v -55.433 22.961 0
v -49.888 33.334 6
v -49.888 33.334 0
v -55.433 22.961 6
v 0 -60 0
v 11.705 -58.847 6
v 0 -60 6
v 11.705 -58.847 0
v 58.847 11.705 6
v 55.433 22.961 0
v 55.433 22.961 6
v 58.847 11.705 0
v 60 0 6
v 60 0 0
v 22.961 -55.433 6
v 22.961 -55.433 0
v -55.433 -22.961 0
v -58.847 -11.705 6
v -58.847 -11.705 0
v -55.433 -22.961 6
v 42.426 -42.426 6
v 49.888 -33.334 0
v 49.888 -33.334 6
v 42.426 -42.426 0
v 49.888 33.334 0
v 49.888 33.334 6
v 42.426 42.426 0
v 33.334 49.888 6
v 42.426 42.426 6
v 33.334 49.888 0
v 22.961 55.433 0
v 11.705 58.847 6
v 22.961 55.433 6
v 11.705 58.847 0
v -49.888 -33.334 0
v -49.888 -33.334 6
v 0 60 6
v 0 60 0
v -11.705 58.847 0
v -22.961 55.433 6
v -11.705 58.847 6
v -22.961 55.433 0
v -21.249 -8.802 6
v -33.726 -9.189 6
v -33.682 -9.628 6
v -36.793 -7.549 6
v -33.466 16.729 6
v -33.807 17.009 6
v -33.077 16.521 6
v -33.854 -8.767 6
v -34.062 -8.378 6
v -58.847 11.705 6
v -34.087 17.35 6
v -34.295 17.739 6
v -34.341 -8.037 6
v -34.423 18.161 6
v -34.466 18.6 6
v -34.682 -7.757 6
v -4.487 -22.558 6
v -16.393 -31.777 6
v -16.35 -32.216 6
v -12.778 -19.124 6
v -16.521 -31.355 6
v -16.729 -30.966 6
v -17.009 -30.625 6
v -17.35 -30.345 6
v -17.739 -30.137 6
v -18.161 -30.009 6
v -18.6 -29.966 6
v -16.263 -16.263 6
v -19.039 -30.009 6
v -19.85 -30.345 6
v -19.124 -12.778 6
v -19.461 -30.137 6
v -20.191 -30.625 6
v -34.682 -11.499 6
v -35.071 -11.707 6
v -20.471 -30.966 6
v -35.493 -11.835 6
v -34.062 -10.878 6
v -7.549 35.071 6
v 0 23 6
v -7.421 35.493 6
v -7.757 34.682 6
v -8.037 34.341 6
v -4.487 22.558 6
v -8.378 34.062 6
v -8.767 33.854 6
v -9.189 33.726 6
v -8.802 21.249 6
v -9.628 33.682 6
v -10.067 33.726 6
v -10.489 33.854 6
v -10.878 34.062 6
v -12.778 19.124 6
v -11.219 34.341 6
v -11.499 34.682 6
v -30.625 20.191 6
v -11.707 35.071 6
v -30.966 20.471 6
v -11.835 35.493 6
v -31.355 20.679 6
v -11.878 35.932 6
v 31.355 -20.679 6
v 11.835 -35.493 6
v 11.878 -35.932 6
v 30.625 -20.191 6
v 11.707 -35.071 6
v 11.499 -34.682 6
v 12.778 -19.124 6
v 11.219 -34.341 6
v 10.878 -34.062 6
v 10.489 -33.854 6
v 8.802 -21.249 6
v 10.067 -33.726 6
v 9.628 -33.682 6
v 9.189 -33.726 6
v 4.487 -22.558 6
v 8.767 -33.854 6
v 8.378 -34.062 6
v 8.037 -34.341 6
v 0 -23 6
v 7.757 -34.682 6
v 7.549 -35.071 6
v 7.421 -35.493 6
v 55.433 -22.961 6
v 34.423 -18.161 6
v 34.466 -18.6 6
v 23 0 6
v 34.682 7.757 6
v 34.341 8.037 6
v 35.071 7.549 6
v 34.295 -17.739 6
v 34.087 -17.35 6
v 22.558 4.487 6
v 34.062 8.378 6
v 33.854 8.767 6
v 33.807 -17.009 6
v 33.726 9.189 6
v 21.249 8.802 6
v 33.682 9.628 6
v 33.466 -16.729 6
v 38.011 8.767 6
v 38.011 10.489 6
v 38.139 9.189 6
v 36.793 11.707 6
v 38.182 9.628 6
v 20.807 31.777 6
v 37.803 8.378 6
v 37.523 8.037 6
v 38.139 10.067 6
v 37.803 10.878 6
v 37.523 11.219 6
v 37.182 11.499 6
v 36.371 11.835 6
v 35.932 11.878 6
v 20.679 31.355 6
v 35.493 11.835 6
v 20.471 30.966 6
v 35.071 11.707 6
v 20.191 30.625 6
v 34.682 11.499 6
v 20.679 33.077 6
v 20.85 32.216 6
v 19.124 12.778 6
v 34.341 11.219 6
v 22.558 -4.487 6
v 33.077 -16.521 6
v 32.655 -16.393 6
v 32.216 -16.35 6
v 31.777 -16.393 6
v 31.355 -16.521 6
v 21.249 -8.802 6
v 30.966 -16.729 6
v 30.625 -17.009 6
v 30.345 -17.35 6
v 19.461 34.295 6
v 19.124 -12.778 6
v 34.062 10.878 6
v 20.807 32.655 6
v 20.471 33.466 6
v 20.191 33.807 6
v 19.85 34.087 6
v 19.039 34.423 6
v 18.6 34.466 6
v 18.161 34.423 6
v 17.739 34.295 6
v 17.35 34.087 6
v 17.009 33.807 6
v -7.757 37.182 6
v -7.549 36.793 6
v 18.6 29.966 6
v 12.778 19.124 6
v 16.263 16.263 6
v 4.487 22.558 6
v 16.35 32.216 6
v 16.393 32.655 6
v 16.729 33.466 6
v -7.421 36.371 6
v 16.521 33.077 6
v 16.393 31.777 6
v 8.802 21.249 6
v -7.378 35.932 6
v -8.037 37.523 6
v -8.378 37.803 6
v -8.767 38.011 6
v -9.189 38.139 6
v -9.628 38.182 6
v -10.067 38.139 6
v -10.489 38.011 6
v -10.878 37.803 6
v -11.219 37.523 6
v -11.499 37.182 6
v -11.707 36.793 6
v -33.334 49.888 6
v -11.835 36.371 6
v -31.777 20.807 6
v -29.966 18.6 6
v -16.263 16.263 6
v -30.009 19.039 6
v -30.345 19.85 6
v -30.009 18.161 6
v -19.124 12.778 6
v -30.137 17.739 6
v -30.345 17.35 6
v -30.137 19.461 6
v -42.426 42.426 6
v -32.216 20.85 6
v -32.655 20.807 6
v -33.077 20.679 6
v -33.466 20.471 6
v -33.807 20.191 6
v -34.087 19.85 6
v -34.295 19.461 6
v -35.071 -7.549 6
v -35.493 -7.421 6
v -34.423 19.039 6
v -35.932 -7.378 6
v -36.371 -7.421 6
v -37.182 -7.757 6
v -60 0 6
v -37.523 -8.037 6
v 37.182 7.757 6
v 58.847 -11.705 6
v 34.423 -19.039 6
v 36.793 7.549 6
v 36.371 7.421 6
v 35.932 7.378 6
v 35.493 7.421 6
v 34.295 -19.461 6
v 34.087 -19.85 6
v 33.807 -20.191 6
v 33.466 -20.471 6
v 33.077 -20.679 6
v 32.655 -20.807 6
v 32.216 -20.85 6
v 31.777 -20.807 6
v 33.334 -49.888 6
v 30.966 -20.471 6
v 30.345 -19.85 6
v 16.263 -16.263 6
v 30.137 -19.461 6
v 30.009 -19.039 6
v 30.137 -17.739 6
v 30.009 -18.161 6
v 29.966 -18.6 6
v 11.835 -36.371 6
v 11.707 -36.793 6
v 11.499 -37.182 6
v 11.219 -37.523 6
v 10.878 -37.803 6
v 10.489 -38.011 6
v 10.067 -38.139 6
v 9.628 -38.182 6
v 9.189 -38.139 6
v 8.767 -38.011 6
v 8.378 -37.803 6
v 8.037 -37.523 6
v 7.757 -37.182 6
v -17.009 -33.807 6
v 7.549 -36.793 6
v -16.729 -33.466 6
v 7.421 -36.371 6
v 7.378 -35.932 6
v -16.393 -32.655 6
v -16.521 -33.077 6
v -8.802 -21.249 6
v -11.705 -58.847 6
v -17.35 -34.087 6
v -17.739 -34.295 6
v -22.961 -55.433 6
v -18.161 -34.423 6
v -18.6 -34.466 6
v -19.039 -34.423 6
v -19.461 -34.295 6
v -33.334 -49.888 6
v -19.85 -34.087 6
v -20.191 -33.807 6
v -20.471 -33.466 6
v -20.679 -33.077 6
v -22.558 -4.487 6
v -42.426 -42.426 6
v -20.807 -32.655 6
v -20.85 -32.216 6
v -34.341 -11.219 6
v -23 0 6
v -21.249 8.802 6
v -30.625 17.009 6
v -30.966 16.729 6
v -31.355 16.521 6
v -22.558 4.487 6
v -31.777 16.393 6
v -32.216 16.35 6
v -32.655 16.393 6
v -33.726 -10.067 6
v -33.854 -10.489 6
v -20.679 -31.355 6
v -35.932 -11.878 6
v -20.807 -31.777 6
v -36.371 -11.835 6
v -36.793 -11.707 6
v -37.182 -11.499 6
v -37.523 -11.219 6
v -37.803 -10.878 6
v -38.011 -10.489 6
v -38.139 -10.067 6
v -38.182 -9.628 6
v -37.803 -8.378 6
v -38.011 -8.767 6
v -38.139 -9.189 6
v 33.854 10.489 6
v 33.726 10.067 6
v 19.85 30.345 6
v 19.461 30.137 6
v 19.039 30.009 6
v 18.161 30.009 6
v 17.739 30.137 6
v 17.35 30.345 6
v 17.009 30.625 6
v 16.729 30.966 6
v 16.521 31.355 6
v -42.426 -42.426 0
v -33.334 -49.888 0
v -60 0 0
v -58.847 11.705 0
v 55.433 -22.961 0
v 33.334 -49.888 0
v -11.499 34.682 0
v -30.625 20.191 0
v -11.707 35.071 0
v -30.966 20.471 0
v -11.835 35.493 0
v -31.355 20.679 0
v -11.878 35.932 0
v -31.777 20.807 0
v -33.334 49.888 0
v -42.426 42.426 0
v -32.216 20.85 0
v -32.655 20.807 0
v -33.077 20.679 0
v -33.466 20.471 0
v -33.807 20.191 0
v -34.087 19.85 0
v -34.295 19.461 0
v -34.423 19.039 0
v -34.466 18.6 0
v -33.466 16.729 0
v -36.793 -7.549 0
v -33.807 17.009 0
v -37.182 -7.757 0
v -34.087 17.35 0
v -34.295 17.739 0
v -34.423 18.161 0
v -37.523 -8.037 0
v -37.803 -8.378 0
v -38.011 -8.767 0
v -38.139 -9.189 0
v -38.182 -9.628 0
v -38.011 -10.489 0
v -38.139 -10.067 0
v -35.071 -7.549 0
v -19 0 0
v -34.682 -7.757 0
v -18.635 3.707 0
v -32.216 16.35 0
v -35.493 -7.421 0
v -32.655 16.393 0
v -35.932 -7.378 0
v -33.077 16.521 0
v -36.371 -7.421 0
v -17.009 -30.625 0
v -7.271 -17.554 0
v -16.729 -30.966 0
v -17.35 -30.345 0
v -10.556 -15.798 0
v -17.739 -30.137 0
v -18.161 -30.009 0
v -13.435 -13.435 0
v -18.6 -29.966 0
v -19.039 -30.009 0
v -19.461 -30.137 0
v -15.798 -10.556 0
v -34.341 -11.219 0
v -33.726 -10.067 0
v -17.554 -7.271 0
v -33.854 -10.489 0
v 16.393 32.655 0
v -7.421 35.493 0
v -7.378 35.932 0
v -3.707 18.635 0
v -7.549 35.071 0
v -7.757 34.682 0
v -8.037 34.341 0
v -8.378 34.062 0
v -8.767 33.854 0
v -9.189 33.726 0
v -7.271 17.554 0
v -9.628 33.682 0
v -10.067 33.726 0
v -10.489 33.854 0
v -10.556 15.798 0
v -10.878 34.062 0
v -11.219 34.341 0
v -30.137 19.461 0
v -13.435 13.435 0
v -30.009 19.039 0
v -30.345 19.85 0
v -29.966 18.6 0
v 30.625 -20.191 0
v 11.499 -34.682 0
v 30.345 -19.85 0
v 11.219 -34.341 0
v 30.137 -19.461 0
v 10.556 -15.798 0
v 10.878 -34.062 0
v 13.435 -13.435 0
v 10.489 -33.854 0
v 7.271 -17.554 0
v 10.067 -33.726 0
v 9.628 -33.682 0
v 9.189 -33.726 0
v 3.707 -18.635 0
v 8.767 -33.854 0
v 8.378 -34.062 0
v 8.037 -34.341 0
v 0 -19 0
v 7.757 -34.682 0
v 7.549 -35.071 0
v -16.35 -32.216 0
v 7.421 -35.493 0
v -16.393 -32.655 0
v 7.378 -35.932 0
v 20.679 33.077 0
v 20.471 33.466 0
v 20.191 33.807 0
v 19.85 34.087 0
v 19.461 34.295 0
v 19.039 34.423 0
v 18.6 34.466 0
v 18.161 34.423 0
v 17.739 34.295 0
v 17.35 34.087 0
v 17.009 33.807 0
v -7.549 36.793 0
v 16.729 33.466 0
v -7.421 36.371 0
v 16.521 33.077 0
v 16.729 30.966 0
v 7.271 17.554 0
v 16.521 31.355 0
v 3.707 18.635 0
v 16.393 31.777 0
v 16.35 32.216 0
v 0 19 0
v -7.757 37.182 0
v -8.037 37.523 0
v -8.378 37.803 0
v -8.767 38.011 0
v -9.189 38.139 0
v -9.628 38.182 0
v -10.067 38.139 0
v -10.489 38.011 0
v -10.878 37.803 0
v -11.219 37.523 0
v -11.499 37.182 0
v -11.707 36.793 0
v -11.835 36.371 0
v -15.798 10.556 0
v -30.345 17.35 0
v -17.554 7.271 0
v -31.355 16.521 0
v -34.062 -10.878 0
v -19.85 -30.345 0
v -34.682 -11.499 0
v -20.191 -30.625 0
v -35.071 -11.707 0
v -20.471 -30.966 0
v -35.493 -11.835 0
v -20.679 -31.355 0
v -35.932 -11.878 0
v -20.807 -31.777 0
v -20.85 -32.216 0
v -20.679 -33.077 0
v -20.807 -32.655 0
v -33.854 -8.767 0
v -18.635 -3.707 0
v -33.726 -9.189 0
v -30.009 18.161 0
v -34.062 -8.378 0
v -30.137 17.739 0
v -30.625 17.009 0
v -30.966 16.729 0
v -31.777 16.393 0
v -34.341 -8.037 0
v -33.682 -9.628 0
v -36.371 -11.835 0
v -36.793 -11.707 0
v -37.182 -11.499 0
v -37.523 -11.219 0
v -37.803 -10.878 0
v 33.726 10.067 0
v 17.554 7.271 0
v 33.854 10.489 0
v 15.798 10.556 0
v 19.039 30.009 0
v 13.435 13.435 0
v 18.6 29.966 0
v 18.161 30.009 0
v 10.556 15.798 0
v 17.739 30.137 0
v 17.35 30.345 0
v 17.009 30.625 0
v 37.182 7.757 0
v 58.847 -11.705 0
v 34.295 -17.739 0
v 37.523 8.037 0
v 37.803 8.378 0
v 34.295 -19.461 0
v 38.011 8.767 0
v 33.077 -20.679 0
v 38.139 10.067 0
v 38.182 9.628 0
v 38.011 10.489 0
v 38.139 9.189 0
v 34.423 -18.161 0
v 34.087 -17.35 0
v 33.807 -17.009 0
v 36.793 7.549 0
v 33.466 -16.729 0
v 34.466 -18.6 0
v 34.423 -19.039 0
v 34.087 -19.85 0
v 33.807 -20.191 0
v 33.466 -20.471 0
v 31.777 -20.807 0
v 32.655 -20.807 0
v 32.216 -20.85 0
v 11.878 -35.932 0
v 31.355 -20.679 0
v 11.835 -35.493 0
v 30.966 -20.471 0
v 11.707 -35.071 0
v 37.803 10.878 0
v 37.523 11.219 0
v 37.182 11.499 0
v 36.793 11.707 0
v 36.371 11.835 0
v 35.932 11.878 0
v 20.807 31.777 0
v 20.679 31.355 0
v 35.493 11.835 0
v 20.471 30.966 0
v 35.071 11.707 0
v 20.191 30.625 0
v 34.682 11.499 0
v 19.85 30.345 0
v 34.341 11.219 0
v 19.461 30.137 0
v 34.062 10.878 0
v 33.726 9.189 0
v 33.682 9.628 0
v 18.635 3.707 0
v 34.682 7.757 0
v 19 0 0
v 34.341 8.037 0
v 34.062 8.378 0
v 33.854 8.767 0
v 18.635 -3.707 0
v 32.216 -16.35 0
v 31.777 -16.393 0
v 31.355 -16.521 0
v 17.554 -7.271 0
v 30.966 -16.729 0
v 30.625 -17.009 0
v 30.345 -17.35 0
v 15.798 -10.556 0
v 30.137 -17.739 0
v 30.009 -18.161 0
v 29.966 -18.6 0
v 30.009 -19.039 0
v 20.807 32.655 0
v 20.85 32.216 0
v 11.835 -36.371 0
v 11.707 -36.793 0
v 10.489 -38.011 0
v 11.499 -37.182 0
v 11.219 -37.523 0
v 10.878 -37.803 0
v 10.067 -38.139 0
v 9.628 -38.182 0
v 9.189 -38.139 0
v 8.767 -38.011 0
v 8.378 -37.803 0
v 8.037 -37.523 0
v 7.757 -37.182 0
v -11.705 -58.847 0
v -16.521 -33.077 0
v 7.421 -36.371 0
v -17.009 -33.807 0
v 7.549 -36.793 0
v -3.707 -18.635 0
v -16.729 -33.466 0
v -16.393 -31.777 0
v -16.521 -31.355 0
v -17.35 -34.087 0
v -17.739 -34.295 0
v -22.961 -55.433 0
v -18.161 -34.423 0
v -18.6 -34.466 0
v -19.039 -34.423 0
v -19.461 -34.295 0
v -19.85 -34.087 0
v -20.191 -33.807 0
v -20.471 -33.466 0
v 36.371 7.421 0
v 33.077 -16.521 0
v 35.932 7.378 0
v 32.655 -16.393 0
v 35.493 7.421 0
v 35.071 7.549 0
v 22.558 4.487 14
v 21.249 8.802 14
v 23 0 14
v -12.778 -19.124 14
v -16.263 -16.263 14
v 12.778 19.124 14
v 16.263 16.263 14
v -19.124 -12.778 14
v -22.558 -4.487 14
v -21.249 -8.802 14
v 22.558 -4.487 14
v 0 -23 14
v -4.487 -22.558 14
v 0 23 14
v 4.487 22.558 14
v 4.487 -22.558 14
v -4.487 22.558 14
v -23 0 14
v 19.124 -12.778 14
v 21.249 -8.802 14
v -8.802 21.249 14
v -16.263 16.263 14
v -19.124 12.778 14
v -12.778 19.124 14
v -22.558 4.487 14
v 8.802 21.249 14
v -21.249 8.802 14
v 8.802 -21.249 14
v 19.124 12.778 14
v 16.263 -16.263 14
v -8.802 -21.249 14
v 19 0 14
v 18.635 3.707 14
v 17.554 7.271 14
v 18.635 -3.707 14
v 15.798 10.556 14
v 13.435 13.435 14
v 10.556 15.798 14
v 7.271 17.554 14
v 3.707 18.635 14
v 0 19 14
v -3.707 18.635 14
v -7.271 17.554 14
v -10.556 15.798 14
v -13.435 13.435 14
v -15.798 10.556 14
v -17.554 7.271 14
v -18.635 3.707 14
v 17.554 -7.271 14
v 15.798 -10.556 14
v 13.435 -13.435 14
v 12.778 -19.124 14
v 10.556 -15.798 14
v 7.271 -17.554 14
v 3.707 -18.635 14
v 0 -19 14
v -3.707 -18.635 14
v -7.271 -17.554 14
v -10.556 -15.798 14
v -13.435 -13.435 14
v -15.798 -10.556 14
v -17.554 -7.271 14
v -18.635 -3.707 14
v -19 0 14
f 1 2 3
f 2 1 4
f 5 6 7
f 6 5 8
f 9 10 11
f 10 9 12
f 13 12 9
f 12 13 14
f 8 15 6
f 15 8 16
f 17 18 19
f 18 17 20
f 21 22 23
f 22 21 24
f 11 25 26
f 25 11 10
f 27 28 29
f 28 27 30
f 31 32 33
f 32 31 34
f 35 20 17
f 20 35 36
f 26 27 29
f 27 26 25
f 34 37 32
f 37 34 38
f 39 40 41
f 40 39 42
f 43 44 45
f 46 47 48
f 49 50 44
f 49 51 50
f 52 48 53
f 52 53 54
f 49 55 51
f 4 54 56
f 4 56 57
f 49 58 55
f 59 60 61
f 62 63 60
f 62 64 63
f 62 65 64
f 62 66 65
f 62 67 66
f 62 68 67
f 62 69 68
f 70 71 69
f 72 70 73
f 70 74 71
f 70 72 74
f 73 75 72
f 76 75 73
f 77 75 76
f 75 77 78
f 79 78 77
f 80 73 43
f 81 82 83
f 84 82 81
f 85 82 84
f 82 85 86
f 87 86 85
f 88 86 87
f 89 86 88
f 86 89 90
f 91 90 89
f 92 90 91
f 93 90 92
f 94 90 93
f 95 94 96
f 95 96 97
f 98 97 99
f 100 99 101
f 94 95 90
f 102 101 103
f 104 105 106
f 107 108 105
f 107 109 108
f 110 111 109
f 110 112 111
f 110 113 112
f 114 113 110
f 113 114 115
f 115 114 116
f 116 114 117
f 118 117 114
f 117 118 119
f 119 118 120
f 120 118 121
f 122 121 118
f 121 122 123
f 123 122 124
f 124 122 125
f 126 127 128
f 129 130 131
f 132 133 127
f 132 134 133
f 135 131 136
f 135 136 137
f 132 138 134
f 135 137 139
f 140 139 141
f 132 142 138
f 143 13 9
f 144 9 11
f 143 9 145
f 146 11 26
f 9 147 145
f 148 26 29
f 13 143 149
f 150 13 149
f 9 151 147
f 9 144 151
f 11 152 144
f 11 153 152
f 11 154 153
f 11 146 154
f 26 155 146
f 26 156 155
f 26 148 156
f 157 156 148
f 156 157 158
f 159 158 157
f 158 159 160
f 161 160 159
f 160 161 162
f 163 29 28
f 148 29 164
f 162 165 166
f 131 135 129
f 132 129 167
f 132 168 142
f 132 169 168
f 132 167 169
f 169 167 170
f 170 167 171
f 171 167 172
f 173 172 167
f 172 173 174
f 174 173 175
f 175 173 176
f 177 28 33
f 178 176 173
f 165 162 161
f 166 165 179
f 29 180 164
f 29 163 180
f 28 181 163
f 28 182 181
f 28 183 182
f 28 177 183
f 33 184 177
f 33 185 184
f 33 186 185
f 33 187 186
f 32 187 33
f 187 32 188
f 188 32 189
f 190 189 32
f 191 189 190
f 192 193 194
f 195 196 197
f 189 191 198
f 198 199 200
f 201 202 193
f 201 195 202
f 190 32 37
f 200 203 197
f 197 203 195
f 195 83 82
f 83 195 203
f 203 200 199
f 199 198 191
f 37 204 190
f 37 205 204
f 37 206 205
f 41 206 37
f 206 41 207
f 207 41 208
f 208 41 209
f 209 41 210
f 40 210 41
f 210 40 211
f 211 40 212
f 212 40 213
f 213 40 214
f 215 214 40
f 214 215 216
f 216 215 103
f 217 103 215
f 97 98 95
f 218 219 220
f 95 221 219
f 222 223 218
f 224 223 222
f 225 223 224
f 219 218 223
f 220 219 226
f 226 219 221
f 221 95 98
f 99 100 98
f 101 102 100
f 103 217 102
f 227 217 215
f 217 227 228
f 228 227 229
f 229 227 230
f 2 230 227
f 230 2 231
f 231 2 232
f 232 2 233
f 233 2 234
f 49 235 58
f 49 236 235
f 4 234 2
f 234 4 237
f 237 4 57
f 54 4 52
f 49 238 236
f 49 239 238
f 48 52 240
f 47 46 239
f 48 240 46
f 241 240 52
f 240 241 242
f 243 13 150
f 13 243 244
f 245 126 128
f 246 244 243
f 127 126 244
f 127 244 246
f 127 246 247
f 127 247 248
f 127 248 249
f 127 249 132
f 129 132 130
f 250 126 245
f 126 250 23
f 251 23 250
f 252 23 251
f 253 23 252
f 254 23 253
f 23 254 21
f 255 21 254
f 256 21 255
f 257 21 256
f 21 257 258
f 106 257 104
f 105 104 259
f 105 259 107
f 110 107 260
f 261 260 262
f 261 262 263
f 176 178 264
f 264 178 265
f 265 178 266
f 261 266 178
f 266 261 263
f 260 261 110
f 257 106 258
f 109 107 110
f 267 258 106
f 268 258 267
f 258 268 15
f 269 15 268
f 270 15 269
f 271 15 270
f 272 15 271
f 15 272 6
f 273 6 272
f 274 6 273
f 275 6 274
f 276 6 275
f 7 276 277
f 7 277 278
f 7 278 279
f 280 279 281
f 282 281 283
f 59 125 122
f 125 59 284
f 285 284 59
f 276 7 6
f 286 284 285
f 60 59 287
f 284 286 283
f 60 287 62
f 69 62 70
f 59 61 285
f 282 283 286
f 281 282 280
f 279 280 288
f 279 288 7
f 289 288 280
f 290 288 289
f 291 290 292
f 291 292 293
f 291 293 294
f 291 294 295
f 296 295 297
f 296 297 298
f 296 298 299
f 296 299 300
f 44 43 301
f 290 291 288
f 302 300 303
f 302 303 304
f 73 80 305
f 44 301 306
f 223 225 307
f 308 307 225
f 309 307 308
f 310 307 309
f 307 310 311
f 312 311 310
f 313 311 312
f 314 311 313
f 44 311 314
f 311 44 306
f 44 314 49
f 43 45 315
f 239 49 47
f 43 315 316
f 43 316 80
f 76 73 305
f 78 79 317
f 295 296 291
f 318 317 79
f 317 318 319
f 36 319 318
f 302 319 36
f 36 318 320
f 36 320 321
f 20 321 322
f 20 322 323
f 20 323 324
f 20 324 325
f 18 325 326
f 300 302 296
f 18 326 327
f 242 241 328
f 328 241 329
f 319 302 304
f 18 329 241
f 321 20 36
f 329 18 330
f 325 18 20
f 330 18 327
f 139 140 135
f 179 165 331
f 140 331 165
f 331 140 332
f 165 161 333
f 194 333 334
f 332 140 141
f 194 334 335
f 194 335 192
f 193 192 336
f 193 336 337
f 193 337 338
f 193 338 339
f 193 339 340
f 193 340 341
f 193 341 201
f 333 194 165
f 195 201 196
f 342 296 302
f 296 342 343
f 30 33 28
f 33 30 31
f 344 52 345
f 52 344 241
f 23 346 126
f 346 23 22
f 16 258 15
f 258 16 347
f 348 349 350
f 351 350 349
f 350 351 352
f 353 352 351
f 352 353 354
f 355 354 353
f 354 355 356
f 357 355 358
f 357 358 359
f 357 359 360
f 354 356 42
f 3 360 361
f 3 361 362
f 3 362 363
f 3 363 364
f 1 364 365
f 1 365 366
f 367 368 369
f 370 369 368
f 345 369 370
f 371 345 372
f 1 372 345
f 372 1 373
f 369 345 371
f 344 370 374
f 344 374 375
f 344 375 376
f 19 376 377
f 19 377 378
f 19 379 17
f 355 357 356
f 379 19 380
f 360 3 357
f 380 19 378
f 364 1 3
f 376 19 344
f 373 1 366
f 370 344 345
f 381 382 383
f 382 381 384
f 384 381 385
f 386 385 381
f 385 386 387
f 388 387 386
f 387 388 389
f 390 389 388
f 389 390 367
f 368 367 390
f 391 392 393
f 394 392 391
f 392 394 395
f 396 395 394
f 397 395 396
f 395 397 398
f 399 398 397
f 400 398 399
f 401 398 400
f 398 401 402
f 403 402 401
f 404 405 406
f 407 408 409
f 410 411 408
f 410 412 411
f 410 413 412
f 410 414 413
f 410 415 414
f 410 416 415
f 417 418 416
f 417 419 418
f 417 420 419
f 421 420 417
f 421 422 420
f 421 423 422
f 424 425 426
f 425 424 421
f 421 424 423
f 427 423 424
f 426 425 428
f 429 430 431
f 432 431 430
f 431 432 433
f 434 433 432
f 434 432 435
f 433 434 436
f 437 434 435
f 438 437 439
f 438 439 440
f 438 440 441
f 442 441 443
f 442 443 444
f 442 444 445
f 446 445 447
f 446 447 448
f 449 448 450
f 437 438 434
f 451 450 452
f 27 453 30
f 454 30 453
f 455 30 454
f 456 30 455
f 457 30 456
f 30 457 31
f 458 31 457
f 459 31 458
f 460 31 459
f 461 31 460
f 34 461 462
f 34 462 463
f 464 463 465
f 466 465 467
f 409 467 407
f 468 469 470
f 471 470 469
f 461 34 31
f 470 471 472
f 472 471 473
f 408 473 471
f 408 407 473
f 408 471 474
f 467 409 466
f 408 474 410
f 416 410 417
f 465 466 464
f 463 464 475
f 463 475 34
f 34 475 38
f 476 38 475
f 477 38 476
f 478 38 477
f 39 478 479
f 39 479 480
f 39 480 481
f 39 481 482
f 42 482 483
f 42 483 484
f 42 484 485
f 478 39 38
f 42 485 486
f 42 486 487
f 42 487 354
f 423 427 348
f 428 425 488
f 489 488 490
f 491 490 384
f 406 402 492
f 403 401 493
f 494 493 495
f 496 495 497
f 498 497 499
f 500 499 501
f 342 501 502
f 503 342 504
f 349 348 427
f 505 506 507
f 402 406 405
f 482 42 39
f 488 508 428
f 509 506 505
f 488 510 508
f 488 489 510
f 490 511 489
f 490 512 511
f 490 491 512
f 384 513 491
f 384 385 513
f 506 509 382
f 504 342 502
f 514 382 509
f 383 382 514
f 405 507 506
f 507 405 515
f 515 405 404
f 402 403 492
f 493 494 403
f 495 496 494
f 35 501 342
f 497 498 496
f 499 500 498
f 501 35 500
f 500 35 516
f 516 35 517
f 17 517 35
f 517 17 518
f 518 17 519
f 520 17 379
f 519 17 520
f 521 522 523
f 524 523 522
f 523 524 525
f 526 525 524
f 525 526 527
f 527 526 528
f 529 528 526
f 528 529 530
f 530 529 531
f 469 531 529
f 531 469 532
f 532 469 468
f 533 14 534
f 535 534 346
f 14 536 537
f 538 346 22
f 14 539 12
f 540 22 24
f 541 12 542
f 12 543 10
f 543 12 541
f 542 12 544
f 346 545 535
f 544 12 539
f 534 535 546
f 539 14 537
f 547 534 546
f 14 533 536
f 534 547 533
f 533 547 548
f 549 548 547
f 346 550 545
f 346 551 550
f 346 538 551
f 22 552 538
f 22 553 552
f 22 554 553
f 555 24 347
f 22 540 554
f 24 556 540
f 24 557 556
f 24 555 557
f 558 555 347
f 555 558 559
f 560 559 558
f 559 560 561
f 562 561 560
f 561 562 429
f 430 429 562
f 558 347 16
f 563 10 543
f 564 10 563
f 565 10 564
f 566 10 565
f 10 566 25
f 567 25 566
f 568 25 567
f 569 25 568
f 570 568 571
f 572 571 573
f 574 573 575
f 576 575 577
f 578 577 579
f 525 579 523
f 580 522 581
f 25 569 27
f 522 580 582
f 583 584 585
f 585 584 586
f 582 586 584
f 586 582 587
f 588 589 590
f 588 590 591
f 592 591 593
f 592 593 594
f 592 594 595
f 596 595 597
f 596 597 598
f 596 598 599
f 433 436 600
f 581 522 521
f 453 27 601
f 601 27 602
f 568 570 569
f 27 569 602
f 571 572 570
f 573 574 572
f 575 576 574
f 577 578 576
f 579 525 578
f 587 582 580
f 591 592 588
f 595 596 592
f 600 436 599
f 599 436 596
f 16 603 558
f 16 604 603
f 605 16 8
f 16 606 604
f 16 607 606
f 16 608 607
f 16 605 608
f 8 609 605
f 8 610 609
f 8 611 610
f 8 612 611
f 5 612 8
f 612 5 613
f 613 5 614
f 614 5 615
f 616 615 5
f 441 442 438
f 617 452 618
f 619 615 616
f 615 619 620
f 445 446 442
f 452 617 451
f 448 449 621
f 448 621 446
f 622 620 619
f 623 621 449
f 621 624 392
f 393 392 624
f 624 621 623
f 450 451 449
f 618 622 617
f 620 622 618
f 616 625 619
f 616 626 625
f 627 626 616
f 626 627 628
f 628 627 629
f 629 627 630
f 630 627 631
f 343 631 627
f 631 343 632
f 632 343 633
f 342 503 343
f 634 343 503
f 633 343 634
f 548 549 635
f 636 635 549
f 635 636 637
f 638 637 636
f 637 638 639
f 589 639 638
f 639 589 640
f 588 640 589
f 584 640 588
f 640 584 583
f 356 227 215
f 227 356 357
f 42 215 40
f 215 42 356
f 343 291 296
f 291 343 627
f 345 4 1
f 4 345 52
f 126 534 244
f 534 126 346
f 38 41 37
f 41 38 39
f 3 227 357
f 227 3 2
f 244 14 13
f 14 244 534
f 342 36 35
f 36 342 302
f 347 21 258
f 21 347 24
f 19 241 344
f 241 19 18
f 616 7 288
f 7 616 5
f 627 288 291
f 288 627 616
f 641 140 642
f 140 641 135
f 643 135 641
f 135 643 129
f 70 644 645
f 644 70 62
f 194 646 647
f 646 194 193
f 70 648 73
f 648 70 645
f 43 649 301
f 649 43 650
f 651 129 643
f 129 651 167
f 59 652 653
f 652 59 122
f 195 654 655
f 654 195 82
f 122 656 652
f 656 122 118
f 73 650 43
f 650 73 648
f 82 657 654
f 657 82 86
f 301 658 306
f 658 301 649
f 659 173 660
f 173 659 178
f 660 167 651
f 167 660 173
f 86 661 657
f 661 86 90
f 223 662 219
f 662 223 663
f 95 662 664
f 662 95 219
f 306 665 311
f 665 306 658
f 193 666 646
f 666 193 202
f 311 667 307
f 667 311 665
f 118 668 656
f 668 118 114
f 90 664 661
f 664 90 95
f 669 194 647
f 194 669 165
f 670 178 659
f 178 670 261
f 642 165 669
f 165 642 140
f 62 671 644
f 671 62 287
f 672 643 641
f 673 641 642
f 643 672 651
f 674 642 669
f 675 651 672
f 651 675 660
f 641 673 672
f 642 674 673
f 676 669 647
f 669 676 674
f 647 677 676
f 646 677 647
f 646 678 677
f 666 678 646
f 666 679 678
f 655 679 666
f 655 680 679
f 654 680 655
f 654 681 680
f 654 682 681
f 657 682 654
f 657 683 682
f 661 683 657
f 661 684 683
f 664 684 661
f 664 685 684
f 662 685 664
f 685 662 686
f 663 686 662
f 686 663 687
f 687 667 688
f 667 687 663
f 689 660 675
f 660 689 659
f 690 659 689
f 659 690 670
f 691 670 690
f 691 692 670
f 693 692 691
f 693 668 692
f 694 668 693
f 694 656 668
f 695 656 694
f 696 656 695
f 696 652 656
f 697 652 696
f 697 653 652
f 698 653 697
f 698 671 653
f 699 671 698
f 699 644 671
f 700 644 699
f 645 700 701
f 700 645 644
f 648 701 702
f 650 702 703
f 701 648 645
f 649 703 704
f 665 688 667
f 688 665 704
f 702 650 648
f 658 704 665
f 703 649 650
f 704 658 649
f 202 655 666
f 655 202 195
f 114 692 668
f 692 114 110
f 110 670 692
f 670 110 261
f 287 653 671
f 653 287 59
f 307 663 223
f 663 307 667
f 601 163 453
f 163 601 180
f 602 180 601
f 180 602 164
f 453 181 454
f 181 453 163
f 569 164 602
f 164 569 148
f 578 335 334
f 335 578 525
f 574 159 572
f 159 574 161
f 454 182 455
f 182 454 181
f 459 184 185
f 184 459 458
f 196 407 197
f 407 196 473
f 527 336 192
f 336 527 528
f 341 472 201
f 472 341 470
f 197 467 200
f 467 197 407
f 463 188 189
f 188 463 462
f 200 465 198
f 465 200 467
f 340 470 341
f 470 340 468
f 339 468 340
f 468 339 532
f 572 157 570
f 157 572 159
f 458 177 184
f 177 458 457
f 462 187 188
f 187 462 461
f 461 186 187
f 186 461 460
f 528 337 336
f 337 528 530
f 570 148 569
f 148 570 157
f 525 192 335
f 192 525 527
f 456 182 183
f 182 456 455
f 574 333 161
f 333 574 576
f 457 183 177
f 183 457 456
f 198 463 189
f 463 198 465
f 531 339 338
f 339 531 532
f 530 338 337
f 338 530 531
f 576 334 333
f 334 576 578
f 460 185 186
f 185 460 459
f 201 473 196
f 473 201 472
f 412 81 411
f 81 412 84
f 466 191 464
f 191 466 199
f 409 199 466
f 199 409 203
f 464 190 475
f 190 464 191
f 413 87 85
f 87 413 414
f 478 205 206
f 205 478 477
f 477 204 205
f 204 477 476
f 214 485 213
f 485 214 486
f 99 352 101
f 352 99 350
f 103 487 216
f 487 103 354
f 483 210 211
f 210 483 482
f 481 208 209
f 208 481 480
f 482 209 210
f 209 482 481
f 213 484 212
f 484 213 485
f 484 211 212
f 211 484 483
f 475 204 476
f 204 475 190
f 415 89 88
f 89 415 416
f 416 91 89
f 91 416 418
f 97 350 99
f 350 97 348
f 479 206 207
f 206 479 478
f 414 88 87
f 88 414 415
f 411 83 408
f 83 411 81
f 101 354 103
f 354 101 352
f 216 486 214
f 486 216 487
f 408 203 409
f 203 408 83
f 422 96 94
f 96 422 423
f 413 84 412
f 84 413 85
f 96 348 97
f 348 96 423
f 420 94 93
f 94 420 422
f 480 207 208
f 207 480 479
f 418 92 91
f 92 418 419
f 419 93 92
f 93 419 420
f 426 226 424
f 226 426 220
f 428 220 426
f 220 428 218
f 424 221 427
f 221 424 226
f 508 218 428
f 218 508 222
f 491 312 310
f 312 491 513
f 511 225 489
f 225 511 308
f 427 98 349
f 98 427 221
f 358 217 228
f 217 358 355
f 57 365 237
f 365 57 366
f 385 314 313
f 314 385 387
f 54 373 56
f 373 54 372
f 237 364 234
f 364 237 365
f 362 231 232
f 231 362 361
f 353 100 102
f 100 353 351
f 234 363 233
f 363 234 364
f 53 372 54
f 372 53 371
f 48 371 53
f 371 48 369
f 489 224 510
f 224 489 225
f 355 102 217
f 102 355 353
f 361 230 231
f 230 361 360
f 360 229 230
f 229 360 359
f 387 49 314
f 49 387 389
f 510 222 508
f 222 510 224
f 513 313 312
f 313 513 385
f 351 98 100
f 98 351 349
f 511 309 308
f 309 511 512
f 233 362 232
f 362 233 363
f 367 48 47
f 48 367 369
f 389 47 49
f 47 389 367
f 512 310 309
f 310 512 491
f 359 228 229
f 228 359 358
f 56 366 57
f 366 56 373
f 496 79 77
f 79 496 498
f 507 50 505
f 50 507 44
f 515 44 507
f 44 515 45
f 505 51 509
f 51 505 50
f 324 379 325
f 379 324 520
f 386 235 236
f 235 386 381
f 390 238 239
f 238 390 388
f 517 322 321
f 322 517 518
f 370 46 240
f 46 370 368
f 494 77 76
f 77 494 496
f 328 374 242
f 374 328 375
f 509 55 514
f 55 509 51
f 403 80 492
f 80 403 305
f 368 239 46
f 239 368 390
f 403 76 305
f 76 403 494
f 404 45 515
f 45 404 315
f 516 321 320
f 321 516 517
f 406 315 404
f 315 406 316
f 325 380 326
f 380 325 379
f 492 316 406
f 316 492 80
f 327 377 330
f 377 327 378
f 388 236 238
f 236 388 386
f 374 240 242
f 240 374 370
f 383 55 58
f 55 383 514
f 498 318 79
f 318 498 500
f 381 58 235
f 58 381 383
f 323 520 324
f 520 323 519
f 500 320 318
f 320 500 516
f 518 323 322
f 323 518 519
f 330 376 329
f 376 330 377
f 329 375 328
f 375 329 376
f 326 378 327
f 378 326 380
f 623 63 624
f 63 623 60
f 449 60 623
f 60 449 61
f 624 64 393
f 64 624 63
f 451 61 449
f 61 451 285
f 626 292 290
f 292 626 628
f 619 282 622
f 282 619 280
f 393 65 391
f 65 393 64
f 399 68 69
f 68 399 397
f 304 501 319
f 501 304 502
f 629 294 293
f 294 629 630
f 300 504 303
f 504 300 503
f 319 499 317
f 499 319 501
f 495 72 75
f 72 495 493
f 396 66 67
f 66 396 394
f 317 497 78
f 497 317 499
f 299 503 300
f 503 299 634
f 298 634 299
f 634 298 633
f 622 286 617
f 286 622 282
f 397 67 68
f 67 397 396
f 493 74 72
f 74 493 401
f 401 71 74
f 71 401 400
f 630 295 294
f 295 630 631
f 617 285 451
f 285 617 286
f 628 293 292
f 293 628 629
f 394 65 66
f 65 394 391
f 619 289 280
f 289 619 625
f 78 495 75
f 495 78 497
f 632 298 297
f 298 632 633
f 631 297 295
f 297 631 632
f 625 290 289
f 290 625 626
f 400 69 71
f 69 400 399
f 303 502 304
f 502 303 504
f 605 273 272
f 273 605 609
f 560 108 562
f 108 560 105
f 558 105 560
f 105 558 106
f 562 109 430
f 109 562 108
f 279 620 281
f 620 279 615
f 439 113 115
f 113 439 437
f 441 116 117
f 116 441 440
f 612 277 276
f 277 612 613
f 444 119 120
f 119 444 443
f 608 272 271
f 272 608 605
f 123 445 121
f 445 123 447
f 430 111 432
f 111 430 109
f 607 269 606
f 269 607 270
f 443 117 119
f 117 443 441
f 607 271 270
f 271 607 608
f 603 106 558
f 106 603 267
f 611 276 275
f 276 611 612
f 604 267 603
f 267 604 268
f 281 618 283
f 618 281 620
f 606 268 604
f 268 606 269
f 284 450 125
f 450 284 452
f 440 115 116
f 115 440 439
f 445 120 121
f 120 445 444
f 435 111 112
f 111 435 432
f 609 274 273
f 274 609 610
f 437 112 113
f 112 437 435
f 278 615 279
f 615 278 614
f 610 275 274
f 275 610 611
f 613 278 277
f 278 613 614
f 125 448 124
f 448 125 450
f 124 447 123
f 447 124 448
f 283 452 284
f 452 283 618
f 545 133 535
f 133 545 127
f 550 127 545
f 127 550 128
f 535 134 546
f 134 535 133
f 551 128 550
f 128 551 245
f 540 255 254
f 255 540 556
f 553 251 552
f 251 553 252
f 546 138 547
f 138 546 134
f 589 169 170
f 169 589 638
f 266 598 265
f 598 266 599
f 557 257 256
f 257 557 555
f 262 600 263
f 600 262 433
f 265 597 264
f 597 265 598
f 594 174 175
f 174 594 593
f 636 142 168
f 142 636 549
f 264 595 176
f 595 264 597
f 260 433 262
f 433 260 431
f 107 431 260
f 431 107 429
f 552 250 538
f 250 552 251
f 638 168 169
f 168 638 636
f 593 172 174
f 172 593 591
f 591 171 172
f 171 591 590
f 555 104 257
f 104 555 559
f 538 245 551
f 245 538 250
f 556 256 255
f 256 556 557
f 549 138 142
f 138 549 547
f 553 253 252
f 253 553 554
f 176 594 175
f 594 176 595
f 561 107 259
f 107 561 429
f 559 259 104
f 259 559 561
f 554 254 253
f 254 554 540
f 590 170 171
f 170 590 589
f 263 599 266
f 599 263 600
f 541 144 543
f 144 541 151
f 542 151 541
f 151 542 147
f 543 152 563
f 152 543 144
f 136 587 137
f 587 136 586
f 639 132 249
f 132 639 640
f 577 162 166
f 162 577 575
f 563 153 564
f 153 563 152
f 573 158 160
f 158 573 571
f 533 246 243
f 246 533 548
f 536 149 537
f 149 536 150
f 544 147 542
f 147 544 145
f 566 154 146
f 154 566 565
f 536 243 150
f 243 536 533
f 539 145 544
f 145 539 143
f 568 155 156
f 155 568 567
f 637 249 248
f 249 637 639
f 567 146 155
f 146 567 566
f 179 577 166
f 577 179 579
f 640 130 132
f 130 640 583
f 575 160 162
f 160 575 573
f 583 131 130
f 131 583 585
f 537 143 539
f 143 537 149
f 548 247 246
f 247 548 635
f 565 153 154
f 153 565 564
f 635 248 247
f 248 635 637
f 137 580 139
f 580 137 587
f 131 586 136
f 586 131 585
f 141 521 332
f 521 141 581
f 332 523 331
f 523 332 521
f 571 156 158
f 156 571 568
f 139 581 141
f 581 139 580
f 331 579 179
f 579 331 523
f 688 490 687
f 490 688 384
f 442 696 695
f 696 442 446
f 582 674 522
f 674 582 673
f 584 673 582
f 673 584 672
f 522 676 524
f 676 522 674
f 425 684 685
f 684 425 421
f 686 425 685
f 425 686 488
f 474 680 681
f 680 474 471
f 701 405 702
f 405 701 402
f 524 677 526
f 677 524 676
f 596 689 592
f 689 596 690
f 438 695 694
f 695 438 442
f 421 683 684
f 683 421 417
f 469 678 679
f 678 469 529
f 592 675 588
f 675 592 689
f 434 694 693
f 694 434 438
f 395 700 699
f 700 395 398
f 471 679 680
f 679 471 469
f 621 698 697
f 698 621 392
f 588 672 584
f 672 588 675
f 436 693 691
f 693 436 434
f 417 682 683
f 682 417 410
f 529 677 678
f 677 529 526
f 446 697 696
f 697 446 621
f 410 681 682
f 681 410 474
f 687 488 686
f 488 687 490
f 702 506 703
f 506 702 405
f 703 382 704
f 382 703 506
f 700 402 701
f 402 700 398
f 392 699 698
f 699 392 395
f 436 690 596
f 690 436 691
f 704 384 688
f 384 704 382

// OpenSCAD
$fn = 32;

// ----------------------------------------------------------------------
// Flange Ø120 x 6
// 8 holes on a Ø74.4 bolt circle, bolted joints
// ----------------------------------------------------------------------

// --- parameters (mm) ---
flange_d = 120;  // outside diameter of the flange
thickness = 6;   // flange thickness
holes = 8;       // number of bolt holes
pcd = 74.4;      // bolt circle diameter
start_deg = 60;  // angle of the first hole, from +X
hole_d = 4.5;    // bolt hole diameter
bore_d = 38;     // central through bore
hub_d = 46;      // hub outside diameter
hub_h = 8;       // hub height above the flange face (0 = no hub)

// --- derived feature positions (mm) ---
height = thickness + hub_h;  // = 14   overall height of the part
pcd_r = pcd / 2;             // = 37.2   bolt circle radius
hole_step = 360 / holes;     // = 45   angular pitch
feature_centers = [
  [pcd_r * cos(start_deg + 0 * hole_step), pcd_r * sin(start_deg + 0 * hole_step)],
  [pcd_r * cos(start_deg + 1 * hole_step), pcd_r * sin(start_deg + 1 * hole_step)],
  [pcd_r * cos(start_deg + 2 * hole_step), pcd_r * sin(start_deg + 2 * hole_step)],
  [pcd_r * cos(start_deg + 3 * hole_step), pcd_r * sin(start_deg + 3 * hole_step)],
  [pcd_r * cos(start_deg + 4 * hole_step), pcd_r * sin(start_deg + 4 * hole_step)],
  [pcd_r * cos(start_deg + 5 * hole_step), pcd_r * sin(start_deg + 5 * hole_step)],
  [pcd_r * cos(start_deg + 6 * hole_step), pcd_r * sin(start_deg + 6 * hole_step)],
  [pcd_r * cos(start_deg + 7 * hole_step), pcd_r * sin(start_deg + 7 * hole_step)]
];   // bolt hole centres on the pitch circle

// flange disc, every hole and the bore cut straight through
difference() {
  union() {
    cylinder(d = flange_d, h = thickness);
    cylinder(d = hub_d, h = height);  // hub, overlapped into the flange
  }
  translate([0, 0, -1]) cylinder(d = bore_d, h = height + 2);  // bore, through
  for (centre = feature_centers)
    translate([centre[0], centre[1], -1]) cylinder(d = hole_d, h = thickness + 2);
}
